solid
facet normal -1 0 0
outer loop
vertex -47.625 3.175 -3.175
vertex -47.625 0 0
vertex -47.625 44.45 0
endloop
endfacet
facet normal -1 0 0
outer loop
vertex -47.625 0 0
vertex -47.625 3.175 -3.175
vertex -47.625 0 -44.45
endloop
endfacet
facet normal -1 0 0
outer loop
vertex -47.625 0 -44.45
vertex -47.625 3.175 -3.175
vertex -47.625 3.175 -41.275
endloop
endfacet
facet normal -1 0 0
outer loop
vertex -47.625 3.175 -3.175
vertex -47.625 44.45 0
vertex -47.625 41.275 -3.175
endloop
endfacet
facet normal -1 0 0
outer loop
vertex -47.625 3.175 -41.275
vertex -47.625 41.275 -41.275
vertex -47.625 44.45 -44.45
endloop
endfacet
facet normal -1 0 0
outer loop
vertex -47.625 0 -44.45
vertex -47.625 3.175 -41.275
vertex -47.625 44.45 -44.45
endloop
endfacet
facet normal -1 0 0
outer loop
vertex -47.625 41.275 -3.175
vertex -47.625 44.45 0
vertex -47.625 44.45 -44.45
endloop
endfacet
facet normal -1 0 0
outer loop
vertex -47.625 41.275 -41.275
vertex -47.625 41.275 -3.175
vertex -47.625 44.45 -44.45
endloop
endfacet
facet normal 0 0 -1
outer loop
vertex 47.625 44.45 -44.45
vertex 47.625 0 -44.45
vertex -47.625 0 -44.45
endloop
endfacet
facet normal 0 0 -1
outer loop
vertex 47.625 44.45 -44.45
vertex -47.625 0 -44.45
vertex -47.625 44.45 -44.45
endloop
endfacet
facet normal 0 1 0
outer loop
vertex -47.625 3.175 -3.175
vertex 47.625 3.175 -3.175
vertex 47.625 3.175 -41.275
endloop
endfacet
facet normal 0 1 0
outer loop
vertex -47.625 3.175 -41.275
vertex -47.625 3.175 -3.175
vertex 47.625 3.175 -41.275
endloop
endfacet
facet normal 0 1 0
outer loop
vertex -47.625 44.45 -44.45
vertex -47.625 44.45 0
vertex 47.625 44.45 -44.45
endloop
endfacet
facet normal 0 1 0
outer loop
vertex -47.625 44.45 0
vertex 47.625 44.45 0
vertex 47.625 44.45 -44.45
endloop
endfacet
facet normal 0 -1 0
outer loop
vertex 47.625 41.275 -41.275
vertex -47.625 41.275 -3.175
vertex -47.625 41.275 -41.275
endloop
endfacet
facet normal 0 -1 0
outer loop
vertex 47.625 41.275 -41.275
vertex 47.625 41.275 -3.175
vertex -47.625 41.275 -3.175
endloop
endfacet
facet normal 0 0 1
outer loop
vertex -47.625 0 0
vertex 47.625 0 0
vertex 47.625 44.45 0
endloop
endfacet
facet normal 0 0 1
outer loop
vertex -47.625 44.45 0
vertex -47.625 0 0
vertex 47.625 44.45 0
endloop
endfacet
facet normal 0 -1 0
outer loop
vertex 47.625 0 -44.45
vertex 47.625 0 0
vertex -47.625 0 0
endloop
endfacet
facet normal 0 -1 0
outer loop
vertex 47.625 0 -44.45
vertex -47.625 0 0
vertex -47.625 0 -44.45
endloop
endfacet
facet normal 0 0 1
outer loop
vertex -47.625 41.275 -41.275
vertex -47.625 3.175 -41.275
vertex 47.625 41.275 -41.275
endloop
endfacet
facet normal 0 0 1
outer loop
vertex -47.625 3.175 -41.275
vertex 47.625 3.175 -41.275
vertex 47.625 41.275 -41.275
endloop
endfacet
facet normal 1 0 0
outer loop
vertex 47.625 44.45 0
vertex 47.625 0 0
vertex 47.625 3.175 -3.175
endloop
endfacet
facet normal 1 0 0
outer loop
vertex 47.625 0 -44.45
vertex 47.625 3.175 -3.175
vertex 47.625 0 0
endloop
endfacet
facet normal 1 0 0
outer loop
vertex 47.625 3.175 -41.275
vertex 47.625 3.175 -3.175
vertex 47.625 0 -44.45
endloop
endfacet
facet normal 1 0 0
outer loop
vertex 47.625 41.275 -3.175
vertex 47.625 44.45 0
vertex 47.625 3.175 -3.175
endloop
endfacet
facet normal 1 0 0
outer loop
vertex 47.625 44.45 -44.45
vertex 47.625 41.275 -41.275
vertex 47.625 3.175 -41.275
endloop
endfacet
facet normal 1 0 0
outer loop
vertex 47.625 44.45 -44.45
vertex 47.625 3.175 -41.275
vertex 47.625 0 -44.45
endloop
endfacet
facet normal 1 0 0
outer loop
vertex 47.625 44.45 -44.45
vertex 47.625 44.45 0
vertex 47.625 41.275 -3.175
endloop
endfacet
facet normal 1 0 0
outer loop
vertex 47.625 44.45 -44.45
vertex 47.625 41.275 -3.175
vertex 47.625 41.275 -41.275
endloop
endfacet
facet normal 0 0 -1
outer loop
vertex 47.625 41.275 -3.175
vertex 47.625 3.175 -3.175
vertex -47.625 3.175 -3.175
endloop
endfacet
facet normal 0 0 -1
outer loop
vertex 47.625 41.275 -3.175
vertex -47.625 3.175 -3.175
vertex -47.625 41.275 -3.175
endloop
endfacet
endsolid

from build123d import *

# Parameters (mm, degrees)
SKETCH1_W           = 44.45
SKETCH1_H           = 44.45
SKETCH1_W_2         = 38.1
SKETCH1_H_2         = 38.1
BOSS_EXTRUDE1_DEPTH = 47.625


with BuildPart() as part:
    # Sketch1 → Boss-Extrude1 (new body, symmetric)
    with BuildSketch(Plane(origin=(0, 0, 0), x_dir=(0, 0, -1), z_dir=(1, 0, 0))):
        with Locations((22.225, 22.225)):
            Rectangle(SKETCH1_W, SKETCH1_H)
        with Locations((22.225, 22.225)):
            Rectangle(SKETCH1_W_2, SKETCH1_H_2, mode=Mode.SUBTRACT)
    extrude(amount=BOSS_EXTRUDE1_DEPTH, both=True)


solid = part.part
